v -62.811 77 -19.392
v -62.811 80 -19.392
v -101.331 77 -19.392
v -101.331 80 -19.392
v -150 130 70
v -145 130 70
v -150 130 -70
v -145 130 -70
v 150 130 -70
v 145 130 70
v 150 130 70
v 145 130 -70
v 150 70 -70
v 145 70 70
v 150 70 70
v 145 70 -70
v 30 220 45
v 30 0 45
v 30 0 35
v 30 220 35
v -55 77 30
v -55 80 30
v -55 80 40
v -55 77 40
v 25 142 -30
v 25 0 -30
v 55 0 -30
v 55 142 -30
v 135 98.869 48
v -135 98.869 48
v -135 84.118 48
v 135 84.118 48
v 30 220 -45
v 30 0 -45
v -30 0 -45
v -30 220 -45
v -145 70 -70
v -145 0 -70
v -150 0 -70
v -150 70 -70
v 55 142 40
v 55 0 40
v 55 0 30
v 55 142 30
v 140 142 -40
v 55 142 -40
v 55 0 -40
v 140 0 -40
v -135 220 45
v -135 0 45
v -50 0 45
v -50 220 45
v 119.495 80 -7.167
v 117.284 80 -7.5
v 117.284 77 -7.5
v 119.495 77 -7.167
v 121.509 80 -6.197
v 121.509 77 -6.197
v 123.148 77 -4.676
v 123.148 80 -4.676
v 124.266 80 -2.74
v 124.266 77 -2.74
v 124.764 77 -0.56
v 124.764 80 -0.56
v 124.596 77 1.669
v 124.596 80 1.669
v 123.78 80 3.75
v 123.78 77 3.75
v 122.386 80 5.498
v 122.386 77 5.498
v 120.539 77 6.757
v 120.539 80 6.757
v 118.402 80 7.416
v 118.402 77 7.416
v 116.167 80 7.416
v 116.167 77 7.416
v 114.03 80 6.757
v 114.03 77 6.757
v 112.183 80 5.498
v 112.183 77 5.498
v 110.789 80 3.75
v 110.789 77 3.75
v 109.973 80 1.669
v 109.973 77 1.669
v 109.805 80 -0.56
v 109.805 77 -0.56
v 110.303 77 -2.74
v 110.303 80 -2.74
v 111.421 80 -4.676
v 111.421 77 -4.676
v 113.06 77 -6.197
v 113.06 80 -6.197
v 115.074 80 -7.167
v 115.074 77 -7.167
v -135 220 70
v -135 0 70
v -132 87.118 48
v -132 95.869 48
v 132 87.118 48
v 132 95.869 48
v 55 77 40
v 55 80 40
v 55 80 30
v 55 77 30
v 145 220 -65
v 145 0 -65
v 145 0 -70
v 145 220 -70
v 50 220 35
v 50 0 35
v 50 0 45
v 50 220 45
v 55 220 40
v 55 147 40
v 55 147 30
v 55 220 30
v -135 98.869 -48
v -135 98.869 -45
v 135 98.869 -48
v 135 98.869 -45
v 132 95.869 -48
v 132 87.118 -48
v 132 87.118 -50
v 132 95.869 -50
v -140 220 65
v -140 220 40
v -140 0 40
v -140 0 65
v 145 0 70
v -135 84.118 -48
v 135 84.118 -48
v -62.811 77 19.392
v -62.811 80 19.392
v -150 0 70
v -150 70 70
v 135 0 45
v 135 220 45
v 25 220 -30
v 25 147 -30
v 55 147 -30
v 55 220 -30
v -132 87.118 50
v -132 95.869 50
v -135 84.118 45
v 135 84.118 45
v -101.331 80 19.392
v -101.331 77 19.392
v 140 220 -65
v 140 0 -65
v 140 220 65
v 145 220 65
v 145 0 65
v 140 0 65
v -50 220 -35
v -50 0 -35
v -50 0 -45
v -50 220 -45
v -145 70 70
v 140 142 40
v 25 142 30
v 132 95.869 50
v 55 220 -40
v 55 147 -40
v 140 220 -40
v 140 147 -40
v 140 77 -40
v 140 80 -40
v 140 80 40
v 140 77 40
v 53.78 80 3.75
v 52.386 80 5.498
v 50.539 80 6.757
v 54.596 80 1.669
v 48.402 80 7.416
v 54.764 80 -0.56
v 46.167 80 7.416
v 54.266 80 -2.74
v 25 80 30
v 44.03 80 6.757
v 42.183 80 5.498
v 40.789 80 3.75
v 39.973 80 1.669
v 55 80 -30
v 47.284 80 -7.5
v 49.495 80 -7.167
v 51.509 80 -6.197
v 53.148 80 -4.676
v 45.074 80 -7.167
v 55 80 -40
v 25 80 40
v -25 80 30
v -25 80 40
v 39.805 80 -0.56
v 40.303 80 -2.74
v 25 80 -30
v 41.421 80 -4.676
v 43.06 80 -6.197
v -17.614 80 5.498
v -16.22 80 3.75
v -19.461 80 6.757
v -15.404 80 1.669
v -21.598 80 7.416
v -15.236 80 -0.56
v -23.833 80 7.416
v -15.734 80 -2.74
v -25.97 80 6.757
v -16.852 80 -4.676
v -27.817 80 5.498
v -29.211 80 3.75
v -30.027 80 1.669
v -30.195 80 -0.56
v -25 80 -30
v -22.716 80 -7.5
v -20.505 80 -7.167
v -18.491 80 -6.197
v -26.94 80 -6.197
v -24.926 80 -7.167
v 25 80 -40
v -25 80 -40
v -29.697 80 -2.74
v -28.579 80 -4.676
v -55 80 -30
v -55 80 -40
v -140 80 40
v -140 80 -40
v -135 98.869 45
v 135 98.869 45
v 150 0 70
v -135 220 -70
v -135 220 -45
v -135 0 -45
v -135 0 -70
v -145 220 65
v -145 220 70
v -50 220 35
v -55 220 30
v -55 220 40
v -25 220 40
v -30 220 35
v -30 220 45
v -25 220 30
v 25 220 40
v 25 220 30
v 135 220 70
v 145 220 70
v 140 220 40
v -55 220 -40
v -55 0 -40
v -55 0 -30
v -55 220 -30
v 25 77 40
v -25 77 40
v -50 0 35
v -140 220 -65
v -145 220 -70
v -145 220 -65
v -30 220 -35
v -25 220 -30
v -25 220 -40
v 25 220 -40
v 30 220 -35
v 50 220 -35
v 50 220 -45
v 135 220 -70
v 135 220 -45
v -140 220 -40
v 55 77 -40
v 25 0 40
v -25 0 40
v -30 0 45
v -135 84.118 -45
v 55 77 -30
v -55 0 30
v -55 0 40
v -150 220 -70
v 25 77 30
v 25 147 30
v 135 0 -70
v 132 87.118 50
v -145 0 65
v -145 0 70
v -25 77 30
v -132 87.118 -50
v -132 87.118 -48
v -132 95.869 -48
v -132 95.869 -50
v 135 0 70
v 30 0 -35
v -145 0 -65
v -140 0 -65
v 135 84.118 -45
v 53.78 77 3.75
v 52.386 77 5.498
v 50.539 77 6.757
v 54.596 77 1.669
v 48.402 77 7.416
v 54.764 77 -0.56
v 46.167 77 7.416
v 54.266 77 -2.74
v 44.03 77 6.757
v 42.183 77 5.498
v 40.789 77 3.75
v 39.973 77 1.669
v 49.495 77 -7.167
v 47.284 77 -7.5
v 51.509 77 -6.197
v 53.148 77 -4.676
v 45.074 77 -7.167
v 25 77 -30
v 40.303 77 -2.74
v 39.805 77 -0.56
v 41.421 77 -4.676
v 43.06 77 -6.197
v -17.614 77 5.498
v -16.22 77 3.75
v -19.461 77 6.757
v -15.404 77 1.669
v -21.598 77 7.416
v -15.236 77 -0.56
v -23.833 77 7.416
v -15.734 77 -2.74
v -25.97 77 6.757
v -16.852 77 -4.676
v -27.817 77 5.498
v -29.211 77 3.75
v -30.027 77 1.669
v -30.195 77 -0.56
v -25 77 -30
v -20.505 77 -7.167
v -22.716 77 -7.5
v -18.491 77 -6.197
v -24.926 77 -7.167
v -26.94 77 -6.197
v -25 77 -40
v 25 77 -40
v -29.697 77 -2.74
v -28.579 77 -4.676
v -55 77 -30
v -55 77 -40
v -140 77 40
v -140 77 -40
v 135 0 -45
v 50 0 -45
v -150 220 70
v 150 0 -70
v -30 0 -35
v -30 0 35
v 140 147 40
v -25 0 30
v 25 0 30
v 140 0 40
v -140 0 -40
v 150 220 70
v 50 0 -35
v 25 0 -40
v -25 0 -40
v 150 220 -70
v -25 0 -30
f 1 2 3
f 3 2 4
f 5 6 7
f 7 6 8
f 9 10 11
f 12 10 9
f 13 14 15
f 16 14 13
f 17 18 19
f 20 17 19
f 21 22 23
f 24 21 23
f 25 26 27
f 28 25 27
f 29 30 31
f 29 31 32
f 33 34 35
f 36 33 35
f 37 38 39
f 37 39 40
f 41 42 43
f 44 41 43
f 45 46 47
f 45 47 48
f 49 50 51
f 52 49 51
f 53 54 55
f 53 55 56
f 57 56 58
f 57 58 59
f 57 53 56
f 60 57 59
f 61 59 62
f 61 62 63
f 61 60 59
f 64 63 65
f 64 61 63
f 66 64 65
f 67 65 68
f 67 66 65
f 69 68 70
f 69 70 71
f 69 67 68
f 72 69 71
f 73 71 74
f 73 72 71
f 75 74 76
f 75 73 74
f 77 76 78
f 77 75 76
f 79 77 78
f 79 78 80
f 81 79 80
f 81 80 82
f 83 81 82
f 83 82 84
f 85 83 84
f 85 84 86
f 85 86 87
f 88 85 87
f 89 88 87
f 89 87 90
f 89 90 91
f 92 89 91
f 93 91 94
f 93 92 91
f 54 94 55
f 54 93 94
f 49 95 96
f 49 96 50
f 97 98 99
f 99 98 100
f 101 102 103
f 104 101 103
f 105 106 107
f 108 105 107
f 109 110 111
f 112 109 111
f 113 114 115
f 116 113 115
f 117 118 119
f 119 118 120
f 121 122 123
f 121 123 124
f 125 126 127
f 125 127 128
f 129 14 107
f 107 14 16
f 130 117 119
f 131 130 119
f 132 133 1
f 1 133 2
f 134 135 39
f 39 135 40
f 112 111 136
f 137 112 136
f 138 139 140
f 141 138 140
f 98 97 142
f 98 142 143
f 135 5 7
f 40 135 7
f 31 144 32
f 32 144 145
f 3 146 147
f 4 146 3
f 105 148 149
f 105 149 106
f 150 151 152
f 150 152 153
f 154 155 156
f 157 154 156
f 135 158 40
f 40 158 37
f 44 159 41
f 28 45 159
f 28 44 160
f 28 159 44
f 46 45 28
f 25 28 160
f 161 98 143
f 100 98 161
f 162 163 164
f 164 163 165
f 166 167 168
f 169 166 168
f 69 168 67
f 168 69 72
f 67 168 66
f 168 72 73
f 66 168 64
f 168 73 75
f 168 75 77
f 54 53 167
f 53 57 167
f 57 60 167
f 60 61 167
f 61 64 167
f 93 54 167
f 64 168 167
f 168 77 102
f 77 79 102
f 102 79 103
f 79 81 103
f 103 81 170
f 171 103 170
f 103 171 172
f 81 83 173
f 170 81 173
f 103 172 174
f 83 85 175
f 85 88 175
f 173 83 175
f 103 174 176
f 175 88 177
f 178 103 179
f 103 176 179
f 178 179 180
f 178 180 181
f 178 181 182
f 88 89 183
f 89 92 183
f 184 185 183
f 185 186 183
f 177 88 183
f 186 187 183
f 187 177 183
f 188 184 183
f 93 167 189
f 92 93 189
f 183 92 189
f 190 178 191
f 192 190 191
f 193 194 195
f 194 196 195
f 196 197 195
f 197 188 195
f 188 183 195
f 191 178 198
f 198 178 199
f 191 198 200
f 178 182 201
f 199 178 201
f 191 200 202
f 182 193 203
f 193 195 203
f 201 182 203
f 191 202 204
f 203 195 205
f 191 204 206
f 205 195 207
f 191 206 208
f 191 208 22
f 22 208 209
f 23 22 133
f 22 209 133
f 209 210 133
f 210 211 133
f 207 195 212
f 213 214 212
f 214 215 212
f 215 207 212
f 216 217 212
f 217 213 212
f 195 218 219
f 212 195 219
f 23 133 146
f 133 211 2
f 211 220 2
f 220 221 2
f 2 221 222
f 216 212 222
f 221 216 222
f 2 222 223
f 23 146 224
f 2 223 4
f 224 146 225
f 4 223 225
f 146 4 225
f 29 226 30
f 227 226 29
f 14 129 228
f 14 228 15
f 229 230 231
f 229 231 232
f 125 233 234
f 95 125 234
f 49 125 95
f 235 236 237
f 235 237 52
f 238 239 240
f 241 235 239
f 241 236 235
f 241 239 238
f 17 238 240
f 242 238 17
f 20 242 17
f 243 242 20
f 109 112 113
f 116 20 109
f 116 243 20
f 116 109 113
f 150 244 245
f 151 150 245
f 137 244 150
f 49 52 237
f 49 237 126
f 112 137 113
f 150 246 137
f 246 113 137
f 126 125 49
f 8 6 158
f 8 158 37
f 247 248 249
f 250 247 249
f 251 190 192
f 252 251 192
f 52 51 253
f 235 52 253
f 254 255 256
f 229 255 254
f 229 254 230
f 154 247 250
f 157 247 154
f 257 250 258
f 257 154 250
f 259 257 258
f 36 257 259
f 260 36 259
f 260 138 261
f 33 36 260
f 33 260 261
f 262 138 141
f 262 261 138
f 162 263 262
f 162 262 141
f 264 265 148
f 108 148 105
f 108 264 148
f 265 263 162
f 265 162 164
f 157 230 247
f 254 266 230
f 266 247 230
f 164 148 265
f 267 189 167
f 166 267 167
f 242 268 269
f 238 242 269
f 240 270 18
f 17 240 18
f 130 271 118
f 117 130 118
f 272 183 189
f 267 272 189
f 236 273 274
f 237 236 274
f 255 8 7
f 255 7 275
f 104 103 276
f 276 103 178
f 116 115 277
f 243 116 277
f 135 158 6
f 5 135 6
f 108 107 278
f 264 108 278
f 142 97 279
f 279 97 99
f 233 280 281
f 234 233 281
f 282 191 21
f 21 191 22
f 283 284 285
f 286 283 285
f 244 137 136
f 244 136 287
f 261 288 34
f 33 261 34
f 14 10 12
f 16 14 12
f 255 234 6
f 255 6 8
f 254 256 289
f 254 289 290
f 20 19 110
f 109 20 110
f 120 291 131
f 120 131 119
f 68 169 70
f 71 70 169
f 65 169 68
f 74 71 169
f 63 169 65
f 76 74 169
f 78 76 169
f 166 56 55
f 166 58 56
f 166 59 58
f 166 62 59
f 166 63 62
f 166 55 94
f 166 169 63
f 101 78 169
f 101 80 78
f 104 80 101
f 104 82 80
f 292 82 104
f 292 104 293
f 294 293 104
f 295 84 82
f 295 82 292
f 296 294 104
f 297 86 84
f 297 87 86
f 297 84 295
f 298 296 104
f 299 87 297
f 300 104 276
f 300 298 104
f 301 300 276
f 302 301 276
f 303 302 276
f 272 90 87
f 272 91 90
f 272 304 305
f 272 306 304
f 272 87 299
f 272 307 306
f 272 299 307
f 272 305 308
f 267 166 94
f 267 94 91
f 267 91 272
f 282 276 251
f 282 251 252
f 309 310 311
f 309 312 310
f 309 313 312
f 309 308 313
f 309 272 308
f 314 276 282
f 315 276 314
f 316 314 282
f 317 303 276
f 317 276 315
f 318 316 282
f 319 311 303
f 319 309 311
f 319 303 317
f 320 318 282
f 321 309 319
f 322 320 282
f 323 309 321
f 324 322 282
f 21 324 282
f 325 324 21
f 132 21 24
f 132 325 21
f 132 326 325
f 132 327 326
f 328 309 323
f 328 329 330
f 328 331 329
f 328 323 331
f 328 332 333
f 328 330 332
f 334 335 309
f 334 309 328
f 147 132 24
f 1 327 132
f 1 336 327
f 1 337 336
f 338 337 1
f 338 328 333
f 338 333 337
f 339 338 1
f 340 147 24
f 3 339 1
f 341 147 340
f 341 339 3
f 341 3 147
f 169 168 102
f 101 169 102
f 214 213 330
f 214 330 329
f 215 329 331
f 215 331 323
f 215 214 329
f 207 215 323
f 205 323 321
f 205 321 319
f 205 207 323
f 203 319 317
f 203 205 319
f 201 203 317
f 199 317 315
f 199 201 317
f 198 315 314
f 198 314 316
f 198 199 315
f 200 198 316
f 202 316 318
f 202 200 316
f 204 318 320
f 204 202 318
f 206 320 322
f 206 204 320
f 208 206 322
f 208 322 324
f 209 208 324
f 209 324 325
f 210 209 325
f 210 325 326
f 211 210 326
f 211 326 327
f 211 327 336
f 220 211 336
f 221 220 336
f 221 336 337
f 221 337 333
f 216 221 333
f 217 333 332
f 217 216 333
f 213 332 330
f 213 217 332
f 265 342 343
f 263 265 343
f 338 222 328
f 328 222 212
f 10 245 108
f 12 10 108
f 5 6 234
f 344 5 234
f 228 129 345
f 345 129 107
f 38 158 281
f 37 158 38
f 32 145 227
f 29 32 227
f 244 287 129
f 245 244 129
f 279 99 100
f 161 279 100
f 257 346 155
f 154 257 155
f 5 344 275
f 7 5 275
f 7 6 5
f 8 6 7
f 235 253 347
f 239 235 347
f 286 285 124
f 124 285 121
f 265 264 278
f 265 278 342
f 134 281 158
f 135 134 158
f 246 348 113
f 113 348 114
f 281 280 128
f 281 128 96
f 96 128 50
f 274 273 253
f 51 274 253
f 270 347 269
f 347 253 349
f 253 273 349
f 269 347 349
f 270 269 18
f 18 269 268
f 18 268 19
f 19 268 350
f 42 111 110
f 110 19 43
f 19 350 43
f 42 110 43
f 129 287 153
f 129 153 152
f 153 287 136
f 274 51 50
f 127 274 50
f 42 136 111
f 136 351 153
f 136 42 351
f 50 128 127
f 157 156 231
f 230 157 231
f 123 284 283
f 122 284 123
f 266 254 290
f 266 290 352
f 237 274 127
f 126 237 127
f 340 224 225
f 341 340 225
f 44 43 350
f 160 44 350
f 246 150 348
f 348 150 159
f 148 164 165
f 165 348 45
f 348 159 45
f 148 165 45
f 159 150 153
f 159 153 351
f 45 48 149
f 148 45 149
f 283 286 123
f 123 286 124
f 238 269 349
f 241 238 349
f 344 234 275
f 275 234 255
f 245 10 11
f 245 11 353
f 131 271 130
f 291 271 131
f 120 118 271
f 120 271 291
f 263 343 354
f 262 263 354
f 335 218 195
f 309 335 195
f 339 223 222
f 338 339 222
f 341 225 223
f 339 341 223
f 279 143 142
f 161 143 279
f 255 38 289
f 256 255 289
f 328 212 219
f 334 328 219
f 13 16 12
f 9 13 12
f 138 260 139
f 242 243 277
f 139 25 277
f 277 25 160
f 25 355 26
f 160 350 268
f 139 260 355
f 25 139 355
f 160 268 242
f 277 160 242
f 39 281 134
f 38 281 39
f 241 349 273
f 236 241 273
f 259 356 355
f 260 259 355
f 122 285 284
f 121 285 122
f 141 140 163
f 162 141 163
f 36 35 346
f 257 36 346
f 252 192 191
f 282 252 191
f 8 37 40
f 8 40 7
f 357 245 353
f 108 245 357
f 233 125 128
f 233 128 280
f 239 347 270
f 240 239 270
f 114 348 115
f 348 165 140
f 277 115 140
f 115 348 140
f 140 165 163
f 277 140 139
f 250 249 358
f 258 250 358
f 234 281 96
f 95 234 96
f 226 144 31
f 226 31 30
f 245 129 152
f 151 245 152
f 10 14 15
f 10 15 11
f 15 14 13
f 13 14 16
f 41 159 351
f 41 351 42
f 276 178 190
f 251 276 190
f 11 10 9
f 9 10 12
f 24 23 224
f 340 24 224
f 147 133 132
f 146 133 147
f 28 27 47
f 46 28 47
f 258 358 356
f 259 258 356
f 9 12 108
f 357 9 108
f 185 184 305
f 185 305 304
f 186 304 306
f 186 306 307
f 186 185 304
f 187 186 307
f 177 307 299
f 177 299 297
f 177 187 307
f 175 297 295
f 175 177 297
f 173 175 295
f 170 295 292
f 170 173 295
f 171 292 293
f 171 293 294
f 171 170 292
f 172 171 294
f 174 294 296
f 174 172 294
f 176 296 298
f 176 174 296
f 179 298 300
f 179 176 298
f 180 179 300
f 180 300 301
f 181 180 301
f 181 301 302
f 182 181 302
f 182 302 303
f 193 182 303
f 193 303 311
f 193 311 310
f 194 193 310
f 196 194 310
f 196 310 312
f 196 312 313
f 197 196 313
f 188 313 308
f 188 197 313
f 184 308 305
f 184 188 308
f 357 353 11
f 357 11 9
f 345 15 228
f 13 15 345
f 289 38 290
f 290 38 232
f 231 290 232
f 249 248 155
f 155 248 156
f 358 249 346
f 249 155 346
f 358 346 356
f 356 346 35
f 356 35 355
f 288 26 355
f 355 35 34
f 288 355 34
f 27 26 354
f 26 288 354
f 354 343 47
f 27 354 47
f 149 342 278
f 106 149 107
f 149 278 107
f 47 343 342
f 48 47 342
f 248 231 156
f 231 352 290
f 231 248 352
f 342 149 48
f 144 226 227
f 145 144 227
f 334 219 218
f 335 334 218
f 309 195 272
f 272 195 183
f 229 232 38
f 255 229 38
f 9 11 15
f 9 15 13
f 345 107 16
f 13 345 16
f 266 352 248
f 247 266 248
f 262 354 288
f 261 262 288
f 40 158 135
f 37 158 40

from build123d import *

# Parameters (mm, degrees)
EPAISSIR1_DEPTH         = 220
ESQUISSE4_W             = 140
ESQUISSE4_H             = 60
ESQUISSE4_H_2           = 80
ENL_V_MAT_EXTRU_1_DEPTH = 5
ESQUISSE5_W             = 140
ESQUISSE5_H             = 90
BOSS_EXTRU_3_DEPTH      = 5
ESQUISSE7_W             = 140
ESQUISSE7_H             = 60
BOSS_EXTRU_4_DEPTH      = 5
ESQUISSE8_W             = 140
ESQUISSE8_H             = 70
BOSS_EXTRU_5_DEPTH      = 5
ESQUISSE9_R             = 7.5
ESQUISSE9_W             = 38.519996312
ESQUISSE9_H             = 38.783125764
BOSS_EXTRU_6_DEPTH      = 3
ESQUISSE10_W            = 140
ESQUISSE10_H            = 220
ENL_V_MAT_EXTRU_2_DEPTH = 5
BOSS_EXTRU_7_DEPTH      = 5
ESQUISSE12_W            = 270
ESQUISSE12_H            = 14.751302264
BOSS_EXTRU_8_DEPTH      = 3
ESQUISSE13_W            = 264
ESQUISSE13_H            = 8.751302264
BOSS_EXTRU_9_DEPTH      = 2


# Read off the part's stored shape, not the designer's step: Epaissir1
with BuildPart() as part:
    # Epaissir1 outline → Epaissir1 (new body)
    with BuildSketch(Plane(origin=(0, 0, 0), x_dir=(1, 0, 0), z_dir=(0, 1, 0))):
        Polygon((50, 35), (30, 35), (30, 45), (-30, 45), (-30, 35), (-50, 35), (-50, 45), (-135, 45), (-135, 70), (-150, 70), (-150, -70), (-135, -70), (-135, -45), (-50, -45), (-50, -35), (-30, -35), (-30, -45), (30, -45), (30, -35), (50, -35), (50, -45), (135, -45), (135, -70), (150, -70), (150, 70), (135, 70), (135, 45), (50, 45), align=None)
        Polygon((25, 40), (25, 30), (55, 30), (55, 40), (140, 40), (140, 65), (145, 65), (145, -65), (140, -65), (140, -40), (55, -40), (55, -30), (25, -30), (25, -40), (-25, -40), (-25, -30), (-55, -30), (-55, -40), (-140, -40), (-140, -65), (-145, -65), (-145, 65), (-140, 65), (-140, 40), (-55, 40), (-55, 30), (-25, 30), (-25, 40), align=None, mode=Mode.SUBTRACT)
    extrude(amount=EPAISSIR1_DEPTH)

    # Esquisse4 → Enlèv. mat.-Extru.1 (cut)
    with BuildSketch(Plane(origin=(150, 0, 0), x_dir=(0, 0, -1), z_dir=(1, 0, 0))):
        with Locations((0, 110)):
            Rectangle(ESQUISSE4_W, ESQUISSE4_H)
        with Locations((0, 180)):
            Rectangle(ESQUISSE4_W, ESQUISSE4_H_2)
        with Locations((0, 40)):
            Rectangle(ESQUISSE4_W, ESQUISSE4_H_2)
    extrude(amount=-ENL_V_MAT_EXTRU_1_DEPTH, mode=Mode.SUBTRACT)

    # Esquisse10 → Enlèv. mat.-Extru.2 (cut)
    with BuildSketch(Plane.ZY.offset(150)):
        with Locations((0, 110)):
            Rectangle(ESQUISSE10_W, ESQUISSE10_H)
    extrude(amount=-ENL_V_MAT_EXTRU_2_DEPTH, mode=Mode.SUBTRACT)


with BuildPart() as body_2:
    # Esquisse5 → Boss.-Extru.3 (new body)
    with BuildSketch(Plane(origin=(145, 0, 0), x_dir=(0, 0, -1), z_dir=(1, 0, 0))):
        with Locations((0, 175)):
            Rectangle(ESQUISSE5_W, ESQUISSE5_H)
    extrude(amount=BOSS_EXTRU_3_DEPTH)


with BuildPart() as body_3:
    # Esquisse7 → Boss.-Extru.4 (new body)
    with BuildSketch(Plane(origin=(145, 0, 0), x_dir=(0, 0, -1), z_dir=(1, 0, 0))):
        with Locations((0, 100)):
            Rectangle(ESQUISSE7_W, ESQUISSE7_H)
    extrude(amount=BOSS_EXTRU_4_DEPTH)


with BuildPart() as body_4:
    # Esquisse8 → Boss.-Extru.5 (new body)
    with BuildSketch(Plane(origin=(145, 0, 0), x_dir=(0, 0, -1), z_dir=(1, 0, 0))):
        with Locations((0, 35)):
            Rectangle(ESQUISSE8_W, ESQUISSE8_H)
    extrude(amount=BOSS_EXTRU_5_DEPTH)


with BuildPart() as body_5:
    # Esquisse9 → Boss.-Extru.6 (new body)
    with BuildSketch(Plane(origin=(0, 80, 0), x_dir=(-1, 0, 0), z_dir=(0, -1, 0))):
        Polygon((-140, 40), (-140, -40), (-55, -40), (-55, -30), (-25, -30), (-25, -40), (25, -40), (25, -30), (55, -30), (55, -40), (140, -40), (140, 40), (55, 40), (55, 30), (25, 30), (25, 40), (-25, 40), (-25, 30), (-55, 30), (-55, 40), align=None)
        with Locations(Location((22.715511581, 0, 0), (0, 0, 90))):
            Circle(ESQUISSE9_R, mode=Mode.SUBTRACT)
        with Locations(Location((-47.284488419, 0, 0), (0, 0, 90))):
            Circle(ESQUISSE9_R, mode=Mode.SUBTRACT)
        with Locations(Location((-117.284488419, 0, 0), (0, 0, 90))):
            Circle(ESQUISSE9_R, mode=Mode.SUBTRACT)
        with Locations((82.070881684, 0)):
            Rectangle(ESQUISSE9_W, ESQUISSE9_H, mode=Mode.SUBTRACT)
    extrude(amount=BOSS_EXTRU_6_DEPTH)


with BuildPart() as enl_v_mat_extru_2_piece_1:
    # of the separate pieces the step leaves, piece 1, a body of its own (enl_v_mat_extru_2_pieces)
    add(part.part.solids().sort_by_distance((-140, 0, 65))[0])



with BuildPart() as enl_v_mat_extru_2_piece_2:
    # of the separate pieces the step leaves, piece 2, a body of its own (enl_v_mat_extru_2_pieces)
    add(part.part.solids().sort_by_distance((50, 0, -35))[0])


with BuildPart() as body_7:
    # Symétrie1: mirrored copy
    add(body_2.part.mirror(Plane(origin=(0, 0, 0), x_dir=(0, 0, 1), z_dir=(1, 0, 0))))


with BuildPart() as body_8:
    # Sym_trie1 2: mirrored copy
    add(body_3.part.mirror(Plane(origin=(0, 0, 0), x_dir=(0, 0, 1), z_dir=(1, 0, 0))))


with BuildPart() as body_9:
    # Sym_trie1 3: mirrored copy
    add(body_4.part.mirror(Plane(origin=(0, 0, 0), x_dir=(0, 0, 1), z_dir=(1, 0, 0))))


with BuildPart() as enl_v_mat_extru_2_piece_1_1:
    add(enl_v_mat_extru_2_piece_1.part)

    add(enl_v_mat_extru_2_piece_2.part)  # Boss.-Extru.7 merges Enlèv. mat.-Extru.2 piece 2
    # Esquisse11 → Boss.-Extru.7 (add)
    with BuildSketch(Plane(origin=(0, 147, 0), x_dir=(-1, 0, 0), z_dir=(0, -1, 0))):
        Polygon((-25, -30), (-25, 30), (-55, 30), (-55, 40), (-140, 40), (-140, -40), (-55, -40), (-55, -30), align=None)
    extrude(amount=BOSS_EXTRU_7_DEPTH)


with BuildPart() as body_9_2:
    # Esquisse12 → Boss.-Extru.8 (new body)
    with BuildSketch(Plane.XY.offset(45)):
        with Locations((0, 91.493820797)):
            Rectangle(ESQUISSE12_W, ESQUISSE12_H)
    extrude(amount=BOSS_EXTRU_8_DEPTH)


with BuildPart() as body_10:
    # Esquisse13 → Boss.-Extru.9 (new body)
    with BuildSketch(Plane.XY.offset(48)):
        with Locations((0, 91.493820797)):
            Rectangle(ESQUISSE13_W, ESQUISSE13_H)
    extrude(amount=BOSS_EXTRU_9_DEPTH)


with BuildPart() as body_11:
    # Symétrie2: mirrored copy
    add(body_10.part.mirror(Plane.XY))


with BuildPart() as body_12:
    # Sym_trie2 2: mirrored copy
    add(body_9_2.part.mirror(Plane.XY))


solid = Compound([body_2.part, body_3.part, body_4.part, body_5.part, body_7.part, body_8.part, body_9.part, enl_v_mat_extru_2_piece_1_1.part, body_9_2.part, body_10.part, body_11.part, body_12.part])
